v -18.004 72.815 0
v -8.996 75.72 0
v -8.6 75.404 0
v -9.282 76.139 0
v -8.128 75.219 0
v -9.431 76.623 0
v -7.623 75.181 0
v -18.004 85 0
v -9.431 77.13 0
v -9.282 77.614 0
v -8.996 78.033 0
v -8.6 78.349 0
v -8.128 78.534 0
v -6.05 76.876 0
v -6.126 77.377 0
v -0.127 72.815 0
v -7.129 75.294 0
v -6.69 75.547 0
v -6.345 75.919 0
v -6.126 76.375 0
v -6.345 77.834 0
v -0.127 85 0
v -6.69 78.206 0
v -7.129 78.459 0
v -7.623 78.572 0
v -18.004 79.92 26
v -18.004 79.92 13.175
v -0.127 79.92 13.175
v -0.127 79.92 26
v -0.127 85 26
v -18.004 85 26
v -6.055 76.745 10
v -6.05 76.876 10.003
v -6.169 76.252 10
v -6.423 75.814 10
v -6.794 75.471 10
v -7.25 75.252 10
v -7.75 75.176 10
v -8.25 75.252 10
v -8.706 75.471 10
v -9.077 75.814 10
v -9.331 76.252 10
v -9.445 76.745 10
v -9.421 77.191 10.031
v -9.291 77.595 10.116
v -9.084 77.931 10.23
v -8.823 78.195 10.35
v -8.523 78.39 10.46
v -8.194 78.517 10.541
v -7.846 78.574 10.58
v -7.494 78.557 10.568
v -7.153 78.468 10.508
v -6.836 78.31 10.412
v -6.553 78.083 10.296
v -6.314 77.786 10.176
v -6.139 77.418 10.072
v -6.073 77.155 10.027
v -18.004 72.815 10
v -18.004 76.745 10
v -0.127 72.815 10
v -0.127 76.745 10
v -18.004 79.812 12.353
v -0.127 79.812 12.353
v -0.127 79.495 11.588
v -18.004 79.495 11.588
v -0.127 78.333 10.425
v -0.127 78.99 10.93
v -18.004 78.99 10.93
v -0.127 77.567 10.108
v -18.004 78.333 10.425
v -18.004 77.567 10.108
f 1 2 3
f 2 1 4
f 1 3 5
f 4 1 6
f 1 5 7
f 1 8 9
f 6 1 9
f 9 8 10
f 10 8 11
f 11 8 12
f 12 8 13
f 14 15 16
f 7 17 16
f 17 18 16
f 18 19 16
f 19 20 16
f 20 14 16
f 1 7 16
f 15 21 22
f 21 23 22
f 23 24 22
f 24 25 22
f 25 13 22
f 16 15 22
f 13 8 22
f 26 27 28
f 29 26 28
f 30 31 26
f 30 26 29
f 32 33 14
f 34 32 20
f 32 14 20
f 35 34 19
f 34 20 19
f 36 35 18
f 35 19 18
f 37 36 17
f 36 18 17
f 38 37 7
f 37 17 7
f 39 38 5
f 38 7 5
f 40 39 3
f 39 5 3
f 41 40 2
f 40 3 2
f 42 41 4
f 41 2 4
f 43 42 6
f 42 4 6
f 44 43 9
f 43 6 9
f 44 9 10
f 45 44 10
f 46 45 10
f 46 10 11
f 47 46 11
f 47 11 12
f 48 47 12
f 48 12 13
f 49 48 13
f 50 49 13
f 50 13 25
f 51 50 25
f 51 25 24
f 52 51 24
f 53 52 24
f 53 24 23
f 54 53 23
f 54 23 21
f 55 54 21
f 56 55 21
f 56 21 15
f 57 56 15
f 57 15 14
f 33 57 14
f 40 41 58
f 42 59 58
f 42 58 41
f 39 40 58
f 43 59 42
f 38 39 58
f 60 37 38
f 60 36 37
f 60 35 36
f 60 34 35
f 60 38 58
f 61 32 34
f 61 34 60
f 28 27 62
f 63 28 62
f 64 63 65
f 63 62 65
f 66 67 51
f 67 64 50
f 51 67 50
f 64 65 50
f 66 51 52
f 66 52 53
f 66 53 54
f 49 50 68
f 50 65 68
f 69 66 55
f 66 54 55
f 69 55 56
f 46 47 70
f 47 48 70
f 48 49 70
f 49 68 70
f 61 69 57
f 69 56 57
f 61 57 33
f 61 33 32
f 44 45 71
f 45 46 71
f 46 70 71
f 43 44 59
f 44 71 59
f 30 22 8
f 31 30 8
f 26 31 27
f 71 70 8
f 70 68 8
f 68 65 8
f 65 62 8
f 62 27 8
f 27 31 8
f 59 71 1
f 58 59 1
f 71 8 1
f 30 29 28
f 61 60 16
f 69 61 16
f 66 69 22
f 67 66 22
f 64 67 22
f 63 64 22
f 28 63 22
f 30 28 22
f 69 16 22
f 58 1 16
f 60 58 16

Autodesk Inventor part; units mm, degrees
ref_plane "YZ Plane" through (0, 0, 0) normal (1, 0, 0) x (0, 1, 0)
ref_plane "XZ Plane" through (0, 0, 0) normal (0, 1, 0) x (-1, 0, 0)
ref_plane "XY Plane" through (0, 0, 0) normal (0, 0, 1) x (1, 0, 0)
ref_plane "Work Plane1" through (0, 0, 0) normal (0, 0, 1) x (1, 0, 0)
sketch "Sketch1" plane through (0, 0, 0) normal (0, 0, 1) x (1, 0, 0)
  line L0 (17.75, 85) -> (-18.004, 85) construction
  circle A0 centre (-7.75, 70) radius 1.7 construction
  line L1 (-9.375, 72.8146) -> (-6.125, 72.8146) construction
  line L2 (-18.004, 85) -> (-18.004, -85) construction
  line L3 (-3.25, 73.1895) -> (-3.25, 76.1105) construction
  line L4 (-11, 70) -> (-9.375, 72.8146) construction
  line L5 (3.2502, 74.65) -> (3.2502, 77.444) construction
  line L6 (3.2502, 77.825) -> (3.2502, 81) construction
  line L7 (-0.127, 85) -> (-18.004, 85)
  line L8 (-18.004, 85) -> (-18.004, 72.8146)
  line L9 (-18.004, 72.8146) -> (-0.127, 72.8146)
  line L10 (-0.127, 72.8146) -> (-0.127, 85)
  circle A1 centre (-7.75, 76.8764) radius 1.7
  point P0 (0, 0)
  dimension "d0" = 3.4
  dimension "d1" = 12.1854
  dimension "d3" = 17.877
  dimension "d6" = 4.0618
extrude "Leg" add sketch "Sketch1" along normal blind 10
sketch "Sketch2" plane through (0, 0, 10) normal (0, 0, 1) x (1, 0, 0)
  line L0 (-0.127, 72.8146) -> (-0.127, 85) projected
  line L1 (-18.004, 85) -> (-18.004, 72.8146) projected
  line L2 (-18.004, 85) -> (-18.004, 80.9625)
  line L3 (-0.127, 80.9625) -> (-0.127, 85)
  line L4 (-0.127, 85) -> (-18.004, 85)
  line L5 (-18.004, 85) -> (-18.004, 79.92)
  line L6 (-18.004, 79.92) -> (-0.127, 79.92)
  line L7 (-0.127, 79.92) -> (-0.127, 85)
  point P0 (0, 0)
  dimension "d7" = 5.08
extrude "Extrusion2" add sketch "Sketch2" along normal blind 16
fillet "Fillet1" radius 3.175 1 edges at (-9.0655, 79.92, 10)
equation "\"d6\" = 0.333333 * d1"
properties part number "Mounting Bracket Bottom"
